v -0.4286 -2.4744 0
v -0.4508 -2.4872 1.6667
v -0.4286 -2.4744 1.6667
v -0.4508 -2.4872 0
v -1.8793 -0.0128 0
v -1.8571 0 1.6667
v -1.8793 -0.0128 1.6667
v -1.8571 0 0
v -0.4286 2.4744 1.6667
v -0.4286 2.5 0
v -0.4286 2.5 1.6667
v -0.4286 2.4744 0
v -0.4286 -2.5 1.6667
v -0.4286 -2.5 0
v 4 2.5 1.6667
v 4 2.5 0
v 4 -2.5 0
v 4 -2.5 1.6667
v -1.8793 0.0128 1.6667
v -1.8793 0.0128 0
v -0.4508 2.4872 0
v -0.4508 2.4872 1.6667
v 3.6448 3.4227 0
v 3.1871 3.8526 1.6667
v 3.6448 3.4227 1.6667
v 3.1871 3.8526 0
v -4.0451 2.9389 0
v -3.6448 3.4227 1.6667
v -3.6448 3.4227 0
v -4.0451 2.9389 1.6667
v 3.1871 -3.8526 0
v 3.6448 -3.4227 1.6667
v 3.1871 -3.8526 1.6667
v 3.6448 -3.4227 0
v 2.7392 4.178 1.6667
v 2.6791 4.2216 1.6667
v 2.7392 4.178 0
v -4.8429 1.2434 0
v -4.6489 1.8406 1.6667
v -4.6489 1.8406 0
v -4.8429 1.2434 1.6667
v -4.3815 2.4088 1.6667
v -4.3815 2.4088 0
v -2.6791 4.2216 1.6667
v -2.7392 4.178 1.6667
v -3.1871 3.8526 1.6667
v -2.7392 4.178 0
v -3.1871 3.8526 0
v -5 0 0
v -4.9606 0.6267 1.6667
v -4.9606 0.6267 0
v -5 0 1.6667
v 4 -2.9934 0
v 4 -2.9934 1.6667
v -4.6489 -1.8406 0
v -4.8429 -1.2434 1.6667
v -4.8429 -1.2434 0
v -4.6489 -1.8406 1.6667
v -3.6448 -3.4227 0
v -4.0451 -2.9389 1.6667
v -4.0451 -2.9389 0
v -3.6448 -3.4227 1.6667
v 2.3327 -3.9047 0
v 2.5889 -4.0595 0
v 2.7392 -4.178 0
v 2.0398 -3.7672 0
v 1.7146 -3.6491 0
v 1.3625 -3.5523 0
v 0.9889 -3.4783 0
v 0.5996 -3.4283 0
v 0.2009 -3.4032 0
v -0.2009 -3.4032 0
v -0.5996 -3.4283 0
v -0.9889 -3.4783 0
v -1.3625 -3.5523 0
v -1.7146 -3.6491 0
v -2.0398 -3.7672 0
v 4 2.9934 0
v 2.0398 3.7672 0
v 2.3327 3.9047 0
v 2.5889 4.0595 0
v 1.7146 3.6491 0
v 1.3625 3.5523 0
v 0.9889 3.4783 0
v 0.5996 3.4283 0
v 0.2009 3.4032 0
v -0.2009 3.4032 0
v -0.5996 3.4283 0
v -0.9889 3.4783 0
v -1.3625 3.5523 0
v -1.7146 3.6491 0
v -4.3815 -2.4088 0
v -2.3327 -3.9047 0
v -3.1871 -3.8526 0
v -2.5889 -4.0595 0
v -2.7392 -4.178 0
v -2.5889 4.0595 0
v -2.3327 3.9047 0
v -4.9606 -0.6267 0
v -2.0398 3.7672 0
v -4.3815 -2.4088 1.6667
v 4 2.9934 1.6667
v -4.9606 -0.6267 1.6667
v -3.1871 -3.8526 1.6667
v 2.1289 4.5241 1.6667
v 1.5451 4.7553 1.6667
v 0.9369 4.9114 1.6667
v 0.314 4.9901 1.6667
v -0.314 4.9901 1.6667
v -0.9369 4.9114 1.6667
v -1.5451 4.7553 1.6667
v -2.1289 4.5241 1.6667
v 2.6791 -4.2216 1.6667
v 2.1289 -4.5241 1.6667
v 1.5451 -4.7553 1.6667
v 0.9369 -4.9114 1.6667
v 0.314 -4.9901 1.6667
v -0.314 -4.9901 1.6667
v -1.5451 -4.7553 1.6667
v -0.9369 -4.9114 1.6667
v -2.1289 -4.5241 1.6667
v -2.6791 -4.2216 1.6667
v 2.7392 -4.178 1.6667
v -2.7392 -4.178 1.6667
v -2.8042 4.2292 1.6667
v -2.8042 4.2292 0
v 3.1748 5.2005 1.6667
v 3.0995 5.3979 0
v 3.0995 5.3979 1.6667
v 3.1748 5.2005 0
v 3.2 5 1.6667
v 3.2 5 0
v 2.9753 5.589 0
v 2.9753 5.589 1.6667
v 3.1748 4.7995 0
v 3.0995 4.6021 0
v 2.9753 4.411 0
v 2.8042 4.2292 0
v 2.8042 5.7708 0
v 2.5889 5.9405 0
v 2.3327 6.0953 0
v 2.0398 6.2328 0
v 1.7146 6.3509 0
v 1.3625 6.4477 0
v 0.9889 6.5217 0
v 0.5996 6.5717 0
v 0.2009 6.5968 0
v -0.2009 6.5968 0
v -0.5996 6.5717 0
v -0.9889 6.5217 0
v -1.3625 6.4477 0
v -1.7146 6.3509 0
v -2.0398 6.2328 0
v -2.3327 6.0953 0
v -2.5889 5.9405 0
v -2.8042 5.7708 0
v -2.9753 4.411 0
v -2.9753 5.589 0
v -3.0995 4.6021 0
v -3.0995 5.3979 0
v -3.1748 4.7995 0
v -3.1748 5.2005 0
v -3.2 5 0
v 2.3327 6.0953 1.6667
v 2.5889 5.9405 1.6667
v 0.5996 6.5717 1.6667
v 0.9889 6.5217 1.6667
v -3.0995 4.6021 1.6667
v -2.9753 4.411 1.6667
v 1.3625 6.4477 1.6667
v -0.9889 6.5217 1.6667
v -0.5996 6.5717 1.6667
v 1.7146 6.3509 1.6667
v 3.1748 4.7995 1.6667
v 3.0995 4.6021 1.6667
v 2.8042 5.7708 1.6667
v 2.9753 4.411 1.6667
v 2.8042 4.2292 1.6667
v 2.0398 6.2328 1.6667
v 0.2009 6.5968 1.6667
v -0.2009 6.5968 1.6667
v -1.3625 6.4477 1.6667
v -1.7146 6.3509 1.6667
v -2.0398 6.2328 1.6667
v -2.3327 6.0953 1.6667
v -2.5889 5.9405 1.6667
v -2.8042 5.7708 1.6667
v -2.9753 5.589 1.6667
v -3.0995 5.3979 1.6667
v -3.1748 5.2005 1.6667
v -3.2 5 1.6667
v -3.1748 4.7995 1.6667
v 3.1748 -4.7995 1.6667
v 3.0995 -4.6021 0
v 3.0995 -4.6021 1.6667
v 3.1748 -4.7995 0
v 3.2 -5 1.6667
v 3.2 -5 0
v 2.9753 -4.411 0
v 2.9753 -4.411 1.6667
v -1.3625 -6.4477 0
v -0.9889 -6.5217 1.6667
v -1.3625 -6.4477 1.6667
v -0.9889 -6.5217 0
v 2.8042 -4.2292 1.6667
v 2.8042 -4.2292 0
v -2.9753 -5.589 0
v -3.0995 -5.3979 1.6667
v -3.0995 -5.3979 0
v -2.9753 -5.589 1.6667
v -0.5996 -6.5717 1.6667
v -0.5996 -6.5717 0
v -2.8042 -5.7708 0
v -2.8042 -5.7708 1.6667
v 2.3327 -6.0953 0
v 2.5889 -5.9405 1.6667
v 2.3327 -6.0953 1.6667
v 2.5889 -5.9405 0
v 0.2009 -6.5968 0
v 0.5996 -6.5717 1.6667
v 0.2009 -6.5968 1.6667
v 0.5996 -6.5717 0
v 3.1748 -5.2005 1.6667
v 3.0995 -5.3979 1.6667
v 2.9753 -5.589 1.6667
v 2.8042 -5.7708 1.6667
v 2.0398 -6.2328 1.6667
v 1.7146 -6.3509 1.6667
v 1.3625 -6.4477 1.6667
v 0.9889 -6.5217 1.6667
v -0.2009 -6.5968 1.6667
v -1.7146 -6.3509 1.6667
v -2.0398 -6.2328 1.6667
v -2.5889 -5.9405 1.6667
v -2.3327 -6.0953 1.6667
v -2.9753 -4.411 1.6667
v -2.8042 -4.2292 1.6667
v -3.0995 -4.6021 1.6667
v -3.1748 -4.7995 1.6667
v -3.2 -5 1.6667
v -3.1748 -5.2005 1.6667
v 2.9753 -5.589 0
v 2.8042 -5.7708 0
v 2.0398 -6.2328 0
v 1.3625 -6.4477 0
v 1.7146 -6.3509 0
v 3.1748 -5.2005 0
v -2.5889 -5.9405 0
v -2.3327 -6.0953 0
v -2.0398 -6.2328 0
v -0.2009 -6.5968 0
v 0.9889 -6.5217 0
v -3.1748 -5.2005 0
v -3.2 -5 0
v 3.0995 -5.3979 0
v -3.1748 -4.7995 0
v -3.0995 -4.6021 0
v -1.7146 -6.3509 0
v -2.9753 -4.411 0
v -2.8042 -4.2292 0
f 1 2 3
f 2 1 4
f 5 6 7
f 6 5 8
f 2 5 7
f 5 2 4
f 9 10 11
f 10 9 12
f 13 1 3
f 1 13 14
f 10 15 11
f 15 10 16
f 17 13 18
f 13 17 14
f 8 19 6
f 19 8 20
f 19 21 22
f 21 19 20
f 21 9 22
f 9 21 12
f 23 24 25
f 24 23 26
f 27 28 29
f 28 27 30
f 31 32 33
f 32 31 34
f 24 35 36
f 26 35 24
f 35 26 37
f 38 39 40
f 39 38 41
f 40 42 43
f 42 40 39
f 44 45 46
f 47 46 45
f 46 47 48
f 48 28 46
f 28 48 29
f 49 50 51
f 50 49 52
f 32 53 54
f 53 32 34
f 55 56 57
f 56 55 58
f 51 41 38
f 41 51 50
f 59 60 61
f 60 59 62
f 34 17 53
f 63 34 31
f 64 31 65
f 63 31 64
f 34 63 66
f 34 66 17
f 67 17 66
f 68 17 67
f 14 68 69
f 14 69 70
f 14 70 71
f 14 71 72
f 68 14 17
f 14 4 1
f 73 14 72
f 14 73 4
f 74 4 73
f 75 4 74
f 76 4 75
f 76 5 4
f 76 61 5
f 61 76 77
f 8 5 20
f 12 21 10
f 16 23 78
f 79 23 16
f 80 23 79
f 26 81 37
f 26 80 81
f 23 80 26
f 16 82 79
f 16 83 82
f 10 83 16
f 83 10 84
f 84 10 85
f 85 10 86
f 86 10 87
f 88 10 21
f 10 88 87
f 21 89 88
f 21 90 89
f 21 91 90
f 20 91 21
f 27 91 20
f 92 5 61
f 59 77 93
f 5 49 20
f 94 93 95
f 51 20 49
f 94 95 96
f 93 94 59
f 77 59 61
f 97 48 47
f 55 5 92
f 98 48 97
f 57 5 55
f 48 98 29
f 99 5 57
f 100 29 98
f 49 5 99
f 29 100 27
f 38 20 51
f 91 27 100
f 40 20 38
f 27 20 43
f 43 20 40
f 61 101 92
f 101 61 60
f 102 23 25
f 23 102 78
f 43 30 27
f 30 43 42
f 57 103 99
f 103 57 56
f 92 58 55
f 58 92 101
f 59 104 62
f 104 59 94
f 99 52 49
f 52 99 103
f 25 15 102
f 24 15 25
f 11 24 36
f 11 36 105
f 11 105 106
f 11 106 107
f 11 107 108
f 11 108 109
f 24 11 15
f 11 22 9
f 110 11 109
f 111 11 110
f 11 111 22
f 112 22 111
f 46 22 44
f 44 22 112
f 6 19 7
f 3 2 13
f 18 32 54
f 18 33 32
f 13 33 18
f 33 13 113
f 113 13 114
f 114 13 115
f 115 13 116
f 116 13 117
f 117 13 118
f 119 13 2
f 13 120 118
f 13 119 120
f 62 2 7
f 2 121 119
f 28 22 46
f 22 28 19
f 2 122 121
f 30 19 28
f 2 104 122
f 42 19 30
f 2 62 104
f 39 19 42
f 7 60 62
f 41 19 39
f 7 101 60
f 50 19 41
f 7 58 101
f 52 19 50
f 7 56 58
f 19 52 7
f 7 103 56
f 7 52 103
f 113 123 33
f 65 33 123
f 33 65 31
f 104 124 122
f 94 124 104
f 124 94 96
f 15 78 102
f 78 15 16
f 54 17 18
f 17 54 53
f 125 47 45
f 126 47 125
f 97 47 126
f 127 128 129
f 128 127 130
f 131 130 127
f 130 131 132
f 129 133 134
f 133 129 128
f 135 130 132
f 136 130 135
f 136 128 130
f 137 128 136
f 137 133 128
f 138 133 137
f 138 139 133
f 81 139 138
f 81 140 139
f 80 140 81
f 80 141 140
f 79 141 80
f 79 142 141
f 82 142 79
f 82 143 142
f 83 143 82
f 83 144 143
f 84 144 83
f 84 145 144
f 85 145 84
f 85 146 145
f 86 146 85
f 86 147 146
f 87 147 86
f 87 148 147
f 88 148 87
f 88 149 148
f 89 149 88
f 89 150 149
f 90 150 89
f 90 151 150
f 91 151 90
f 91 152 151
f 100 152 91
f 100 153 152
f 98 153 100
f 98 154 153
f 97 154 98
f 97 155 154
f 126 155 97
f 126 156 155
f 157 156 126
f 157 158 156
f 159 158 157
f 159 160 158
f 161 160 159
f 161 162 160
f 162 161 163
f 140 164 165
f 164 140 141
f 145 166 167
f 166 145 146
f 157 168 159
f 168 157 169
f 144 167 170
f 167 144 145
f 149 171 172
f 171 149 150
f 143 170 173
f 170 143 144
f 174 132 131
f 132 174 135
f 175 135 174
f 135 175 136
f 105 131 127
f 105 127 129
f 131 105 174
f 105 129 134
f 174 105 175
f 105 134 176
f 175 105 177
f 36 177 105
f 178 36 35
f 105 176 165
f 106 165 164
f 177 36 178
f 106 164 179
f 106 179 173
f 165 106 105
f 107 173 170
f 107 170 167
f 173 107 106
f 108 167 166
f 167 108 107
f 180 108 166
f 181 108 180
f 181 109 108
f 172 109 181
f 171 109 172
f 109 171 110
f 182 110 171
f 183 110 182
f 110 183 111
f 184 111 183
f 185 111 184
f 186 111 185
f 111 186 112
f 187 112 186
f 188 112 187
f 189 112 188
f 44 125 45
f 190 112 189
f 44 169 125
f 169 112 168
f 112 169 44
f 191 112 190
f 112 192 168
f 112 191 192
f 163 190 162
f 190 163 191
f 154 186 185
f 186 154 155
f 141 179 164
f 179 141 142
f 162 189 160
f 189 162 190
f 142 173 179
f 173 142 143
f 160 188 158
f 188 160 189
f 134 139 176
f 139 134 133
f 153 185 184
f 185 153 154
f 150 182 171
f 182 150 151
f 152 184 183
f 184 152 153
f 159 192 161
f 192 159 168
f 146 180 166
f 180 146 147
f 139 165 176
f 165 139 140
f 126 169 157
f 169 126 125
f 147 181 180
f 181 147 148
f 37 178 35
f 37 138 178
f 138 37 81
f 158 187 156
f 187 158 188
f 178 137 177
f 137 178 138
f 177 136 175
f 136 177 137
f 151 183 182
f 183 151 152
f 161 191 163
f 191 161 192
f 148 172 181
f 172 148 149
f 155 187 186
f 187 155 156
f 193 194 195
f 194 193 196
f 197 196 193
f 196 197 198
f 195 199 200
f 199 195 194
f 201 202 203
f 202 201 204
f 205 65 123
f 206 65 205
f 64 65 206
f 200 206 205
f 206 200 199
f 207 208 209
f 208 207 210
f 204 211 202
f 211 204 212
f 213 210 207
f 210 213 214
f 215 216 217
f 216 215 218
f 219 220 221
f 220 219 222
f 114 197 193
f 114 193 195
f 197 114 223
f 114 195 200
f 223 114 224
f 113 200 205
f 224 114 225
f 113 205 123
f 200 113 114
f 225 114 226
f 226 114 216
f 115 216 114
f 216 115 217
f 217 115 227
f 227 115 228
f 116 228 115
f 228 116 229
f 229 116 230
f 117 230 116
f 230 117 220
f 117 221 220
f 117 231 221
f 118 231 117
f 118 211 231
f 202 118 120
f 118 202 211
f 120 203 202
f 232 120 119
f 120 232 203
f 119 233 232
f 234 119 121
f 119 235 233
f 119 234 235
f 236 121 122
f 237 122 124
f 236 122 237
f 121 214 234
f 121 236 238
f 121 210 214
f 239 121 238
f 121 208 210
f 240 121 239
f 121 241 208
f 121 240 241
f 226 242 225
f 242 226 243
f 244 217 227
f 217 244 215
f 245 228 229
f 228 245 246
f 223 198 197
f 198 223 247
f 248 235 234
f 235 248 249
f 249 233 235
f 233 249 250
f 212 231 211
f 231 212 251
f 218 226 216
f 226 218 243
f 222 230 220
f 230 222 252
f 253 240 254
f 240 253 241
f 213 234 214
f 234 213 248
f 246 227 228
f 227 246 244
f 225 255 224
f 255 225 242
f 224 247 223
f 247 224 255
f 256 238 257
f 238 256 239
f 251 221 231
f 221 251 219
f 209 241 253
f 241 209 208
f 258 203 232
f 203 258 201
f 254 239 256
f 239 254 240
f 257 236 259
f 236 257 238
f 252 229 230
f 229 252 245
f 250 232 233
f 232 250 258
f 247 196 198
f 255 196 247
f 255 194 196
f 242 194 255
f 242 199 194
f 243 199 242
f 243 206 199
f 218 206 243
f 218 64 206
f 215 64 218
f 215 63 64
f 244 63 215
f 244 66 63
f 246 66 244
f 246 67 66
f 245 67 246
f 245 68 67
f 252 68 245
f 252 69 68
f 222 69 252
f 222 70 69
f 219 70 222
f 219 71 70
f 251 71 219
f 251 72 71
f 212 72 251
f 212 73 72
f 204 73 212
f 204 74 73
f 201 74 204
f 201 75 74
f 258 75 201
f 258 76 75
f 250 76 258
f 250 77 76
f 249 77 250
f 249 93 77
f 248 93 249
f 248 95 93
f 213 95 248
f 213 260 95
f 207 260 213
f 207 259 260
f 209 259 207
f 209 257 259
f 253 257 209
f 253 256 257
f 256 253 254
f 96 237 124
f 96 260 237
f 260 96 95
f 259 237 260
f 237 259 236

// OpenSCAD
/* 	Nut-Leia By schlem
		theschlem@gmail.com
	 	6-17-13

A glue-on nut trap for use with laser-cut birch
plywood parts or what have you.  I used these
to hold the bed levelling hardware on my  
Printrbot+

I originally modelled it with square tabs to increase
the torque of the glue attachment, which led to 
the predictable development of a "cinnamon-buns" 
Princess Leia Organa silhouette.  

https://en.wikipedia.org/wiki/Princess_Leia

Hexagon, ellipticalCylinder modules poached from:
 *  OpenSCAD Shapes Library (www.openscad.org)
 *  Copyright (C) 2009  Catarina Mota
 *  Copyright (C) 2010  Elmo Mäntynen
 *
 *  License: LGPL 2.1 or later

*/

// ***************  First Things ***************  

$fn=50*1;

// ***************  Parameters ***************    

// Size of Nut in mm
nut = 5;		// across flats, in MILIMETERS
//		Here's a handy link to inch --> mm conversions
//		http://mdmetric.com/tech/cvtcht.htm



//=== constants and relative values ===

height = nut * .33333333;	// scales height:nut
buns_scale = .80*1;				// scales buns:head

// ***************  Top Level code ***************   

union(){
	jaws(nut);
	CinnamonBuns(nut*buns_scale, (nut/2)*buns_scale, height, nut);
}

// ***************  Modules ***************  

//=== jaws === 

module jaws(x = 4, z = 2) {
	translate([0,0,height/2])
	difference(){
		cylinder(h = height, r =x, center = true);
		
		translate([x/5,0,0])
		union(){
		hexagon(x,x);
		translate([x/2,0,0])
			cube(x, center = true);
		}
		translate([nut*1.8,0,0])
		cube (nut*2, center = true);
	}
}

//=== CinnamonBuns === 

module CinnamonBuns(r1 = 3, r2 = 1.5, h = 2, t = 3){
	translate([0,t,0])
	ellipticalCylinder(r1*buns_scale,r2*buns_scale,h);	

	translate([0,-t,0])
	ellipticalCylinder(r1*buns_scale,r2*buns_scale,h);	
}

//=== hexagon === size is the XY plane size, height in Z

module hexagon(size, height) {
  boxWidth = size/1.75;
  for (r = [-60, 0, 60]) rotate([0,0,r]) cube([boxWidth, size, height], true);
} 

//=== ellipticalCylinder === 

module ellipticalCylinder(w,h, height, center = false) {
  scale([1, h/w, 1]) cylinder(h=height, r=w, center=center);
}
